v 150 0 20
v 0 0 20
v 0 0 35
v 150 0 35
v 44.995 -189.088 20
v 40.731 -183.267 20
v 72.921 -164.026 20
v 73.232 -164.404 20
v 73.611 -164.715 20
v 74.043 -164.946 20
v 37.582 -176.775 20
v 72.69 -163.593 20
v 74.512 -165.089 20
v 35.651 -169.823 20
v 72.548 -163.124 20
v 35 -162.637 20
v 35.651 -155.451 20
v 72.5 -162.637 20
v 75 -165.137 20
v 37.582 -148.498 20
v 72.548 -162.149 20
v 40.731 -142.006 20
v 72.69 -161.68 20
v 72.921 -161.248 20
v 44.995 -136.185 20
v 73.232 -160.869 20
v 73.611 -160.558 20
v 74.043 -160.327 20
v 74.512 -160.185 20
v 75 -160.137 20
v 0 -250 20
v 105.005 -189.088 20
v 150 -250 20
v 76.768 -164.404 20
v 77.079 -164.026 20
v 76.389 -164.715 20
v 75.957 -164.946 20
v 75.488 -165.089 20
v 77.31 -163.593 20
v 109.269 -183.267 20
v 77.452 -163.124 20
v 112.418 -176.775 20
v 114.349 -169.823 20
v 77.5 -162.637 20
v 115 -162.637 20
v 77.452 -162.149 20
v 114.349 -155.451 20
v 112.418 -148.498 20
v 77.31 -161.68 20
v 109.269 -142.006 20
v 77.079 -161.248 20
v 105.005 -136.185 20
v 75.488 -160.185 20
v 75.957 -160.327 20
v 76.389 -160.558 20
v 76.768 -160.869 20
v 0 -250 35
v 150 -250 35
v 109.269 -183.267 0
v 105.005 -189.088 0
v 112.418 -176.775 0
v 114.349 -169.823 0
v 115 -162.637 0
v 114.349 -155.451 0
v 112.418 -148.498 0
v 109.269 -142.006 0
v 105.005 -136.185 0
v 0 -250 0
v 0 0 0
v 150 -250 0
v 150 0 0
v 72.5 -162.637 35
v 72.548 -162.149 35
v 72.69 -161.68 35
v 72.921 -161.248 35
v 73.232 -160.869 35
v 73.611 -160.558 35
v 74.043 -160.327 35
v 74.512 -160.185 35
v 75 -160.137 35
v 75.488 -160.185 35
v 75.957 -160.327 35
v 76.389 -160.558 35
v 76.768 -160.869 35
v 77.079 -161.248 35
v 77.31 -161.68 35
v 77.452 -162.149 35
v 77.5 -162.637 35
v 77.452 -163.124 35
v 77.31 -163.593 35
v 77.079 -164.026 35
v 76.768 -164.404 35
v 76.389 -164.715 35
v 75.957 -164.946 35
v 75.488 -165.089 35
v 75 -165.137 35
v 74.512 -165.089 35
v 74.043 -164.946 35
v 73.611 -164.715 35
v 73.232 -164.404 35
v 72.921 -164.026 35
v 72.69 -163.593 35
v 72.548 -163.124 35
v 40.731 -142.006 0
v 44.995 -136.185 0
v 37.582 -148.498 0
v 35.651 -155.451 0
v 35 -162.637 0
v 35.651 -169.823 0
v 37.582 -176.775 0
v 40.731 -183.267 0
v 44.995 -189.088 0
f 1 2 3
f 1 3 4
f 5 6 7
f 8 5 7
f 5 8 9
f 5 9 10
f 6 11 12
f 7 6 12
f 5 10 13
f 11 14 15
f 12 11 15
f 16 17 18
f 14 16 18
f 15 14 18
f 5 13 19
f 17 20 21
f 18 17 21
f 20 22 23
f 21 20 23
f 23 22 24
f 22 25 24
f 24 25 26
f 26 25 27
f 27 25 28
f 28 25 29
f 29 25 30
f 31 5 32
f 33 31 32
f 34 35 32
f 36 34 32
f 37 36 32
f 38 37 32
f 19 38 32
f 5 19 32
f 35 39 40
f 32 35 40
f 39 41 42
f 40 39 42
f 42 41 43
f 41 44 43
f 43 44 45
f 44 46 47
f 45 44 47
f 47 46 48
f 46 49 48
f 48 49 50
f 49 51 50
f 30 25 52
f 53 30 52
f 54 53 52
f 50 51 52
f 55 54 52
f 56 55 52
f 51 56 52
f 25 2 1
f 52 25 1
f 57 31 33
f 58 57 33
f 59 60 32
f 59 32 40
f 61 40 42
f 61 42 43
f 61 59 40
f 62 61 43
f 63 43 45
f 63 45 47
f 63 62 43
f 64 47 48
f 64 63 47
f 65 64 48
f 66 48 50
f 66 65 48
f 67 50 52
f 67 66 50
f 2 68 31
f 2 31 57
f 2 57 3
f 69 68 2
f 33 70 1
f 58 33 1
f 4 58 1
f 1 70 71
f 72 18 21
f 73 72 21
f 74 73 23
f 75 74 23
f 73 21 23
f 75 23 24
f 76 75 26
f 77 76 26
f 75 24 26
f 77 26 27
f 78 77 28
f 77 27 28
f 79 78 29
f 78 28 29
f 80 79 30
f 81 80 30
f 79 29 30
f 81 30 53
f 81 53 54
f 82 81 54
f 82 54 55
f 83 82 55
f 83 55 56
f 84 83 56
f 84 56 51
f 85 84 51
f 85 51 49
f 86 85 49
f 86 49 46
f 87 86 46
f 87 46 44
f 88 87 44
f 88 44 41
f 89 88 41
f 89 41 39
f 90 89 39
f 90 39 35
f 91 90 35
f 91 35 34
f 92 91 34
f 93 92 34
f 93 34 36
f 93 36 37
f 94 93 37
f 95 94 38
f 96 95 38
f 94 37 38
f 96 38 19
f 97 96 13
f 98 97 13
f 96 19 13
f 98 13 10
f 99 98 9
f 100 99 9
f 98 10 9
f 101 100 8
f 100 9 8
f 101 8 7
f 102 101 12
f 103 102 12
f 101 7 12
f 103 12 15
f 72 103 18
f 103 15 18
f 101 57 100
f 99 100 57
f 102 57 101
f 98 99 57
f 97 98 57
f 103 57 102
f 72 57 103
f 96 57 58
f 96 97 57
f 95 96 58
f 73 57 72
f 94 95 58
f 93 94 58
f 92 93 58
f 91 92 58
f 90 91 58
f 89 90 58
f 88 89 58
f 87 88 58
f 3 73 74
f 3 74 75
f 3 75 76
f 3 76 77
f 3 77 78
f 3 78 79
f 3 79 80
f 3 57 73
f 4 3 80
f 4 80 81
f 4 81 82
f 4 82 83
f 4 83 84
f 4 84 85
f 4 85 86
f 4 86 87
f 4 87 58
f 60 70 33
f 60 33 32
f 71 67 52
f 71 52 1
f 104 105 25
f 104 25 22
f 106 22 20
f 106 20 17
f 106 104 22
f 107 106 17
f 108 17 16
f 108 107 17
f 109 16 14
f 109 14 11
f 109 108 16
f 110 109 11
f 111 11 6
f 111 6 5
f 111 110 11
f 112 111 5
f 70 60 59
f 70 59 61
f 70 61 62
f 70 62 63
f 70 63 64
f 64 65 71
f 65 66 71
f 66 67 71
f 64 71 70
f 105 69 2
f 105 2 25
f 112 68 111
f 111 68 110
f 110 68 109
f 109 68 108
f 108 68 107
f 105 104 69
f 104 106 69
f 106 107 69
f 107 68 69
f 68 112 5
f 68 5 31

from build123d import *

# Parameters (mm, degrees)
SKETCH_1_W          = 150
SKETCH_1_H          = 250
EXTRUDE_1_DEPTH     = 35
CUT_EXTRUDE_1_DEPTH = 20
SKETCH_3_R          = 2.5
CUT_EXTRUDE_2_DEPTH = 293.232783924


with BuildPart() as part:
    # Эскиз1 → Бобышка-Вытянуть1 (new body)
    with BuildSketch(Plane.XY):
        with Locations((75, -125)):
            Rectangle(SKETCH_1_W, SKETCH_1_H)
    extrude(amount=EXTRUDE_1_DEPTH)

    # Эскиз2 → Вырез-Вытянуть1 (cut)
    with BuildSketch(Plane.XY):
        with BuildLine():
            Line((0, 0), (44.994645372, -136.185163226))
            ThreePointArc((44.994645372, -136.185163226), (35, -162.636603521), (44.994645372, -189.088043815))
            Line((44.994645372, -189.088043815), (0, -250))
            Line((0, -250), (150, -250))
            Line((150, -250), (105.005354628, -189.088043815))
            ThreePointArc((105.005354628, -189.088043815), (115, -162.636603521), (105.005354628, -136.185163226))
            Line((105.005354628, -136.185163226), (150, 0))
            Line((150, 0), (0, 0))
        make_face()
    extrude(amount=CUT_EXTRUDE_1_DEPTH, mode=Mode.SUBTRACT)

    # Эскиз3 → Вырез-Вытянуть2 (cut, through all)
    with BuildSketch(Plane(origin=(0, 0, 20), x_dir=(-1, 0, 0), z_dir=(0, 0, -1))):
        with Locations((-75, -162.636603521)):
            Circle(SKETCH_3_R)
    extrude(amount=-CUT_EXTRUDE_2_DEPTH, mode=Mode.SUBTRACT)


solid = part.part
